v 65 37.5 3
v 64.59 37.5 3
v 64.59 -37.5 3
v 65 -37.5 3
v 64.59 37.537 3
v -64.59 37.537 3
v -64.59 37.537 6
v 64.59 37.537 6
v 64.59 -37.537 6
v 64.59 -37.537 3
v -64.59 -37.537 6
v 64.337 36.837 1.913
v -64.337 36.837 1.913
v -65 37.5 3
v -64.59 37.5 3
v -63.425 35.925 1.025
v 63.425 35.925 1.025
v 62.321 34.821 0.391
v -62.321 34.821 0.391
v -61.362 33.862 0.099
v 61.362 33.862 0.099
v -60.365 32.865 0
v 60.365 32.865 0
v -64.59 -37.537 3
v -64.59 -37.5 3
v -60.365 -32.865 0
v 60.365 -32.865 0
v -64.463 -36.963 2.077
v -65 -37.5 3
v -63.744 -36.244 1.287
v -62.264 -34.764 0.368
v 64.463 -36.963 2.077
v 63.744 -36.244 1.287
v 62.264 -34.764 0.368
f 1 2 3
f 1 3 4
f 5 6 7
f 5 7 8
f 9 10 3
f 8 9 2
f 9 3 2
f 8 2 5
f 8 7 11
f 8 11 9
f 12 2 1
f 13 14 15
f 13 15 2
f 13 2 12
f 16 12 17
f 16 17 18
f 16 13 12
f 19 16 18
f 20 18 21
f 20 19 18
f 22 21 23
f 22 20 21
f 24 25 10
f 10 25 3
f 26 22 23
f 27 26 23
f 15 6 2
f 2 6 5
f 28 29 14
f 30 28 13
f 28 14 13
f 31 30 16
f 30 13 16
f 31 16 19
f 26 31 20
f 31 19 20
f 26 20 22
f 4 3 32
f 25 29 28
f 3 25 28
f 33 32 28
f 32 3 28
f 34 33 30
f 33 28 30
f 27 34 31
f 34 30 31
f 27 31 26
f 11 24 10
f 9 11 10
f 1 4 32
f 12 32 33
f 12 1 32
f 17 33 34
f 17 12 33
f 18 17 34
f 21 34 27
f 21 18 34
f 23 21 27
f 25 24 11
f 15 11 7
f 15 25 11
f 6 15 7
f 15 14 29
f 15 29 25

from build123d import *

# Parameters (mm, degrees)
F0_W        = 130
F0_H        = 75
F1_DEPTH    = 3
F2_T1_DEPTH = 153.1732604525
F2_T3_DEPTH = 98.1732604525
F4_W        = 129.1797161102
F4_H        = 75.0736519694
F5_DEPTH    = 3


# Not quite as in the source:
# - a fillet or chamfer that OpenCascade refuses, or shapes differently, is made with other operations: its cross-section is extruded or revolved along the edge and cut away or added


with BuildPart() as f1:
    # F0 (on Top) → F1 (new body)
    with BuildSketch(Plane.XY):
        Rectangle(F0_W, F0_H)
    extrude(amount=F1_DEPTH)

    # F2: fillet of radius 5.08 on 4 edges, made by hand

    # F2_s2 → F2_t1 (cut)
    with BuildSketch(Plane.YZ.offset(-76.5866302263)):
        with BuildLine():
            ThreePointArc((37.5, 3), (35.6257826579, 0.8154484409), (32.8653479095, 0))
            Line((32.8653479095, 0), (37.5, 0))
            Line((37.5, 0), (37.5, 3))
        make_face()
        with BuildLine():
            ThreePointArc((-37.5, 3), (-35.6257826579, 0.8154484409), (-32.8653479095, 0))
            Line((-32.8653479095, 0), (-37.5, 0))
            Line((-37.5, 0), (-37.5, 3))
        make_face()
    extrude(amount=F2_T1_DEPTH, mode=Mode.SUBTRACT)

    # F2_s4 → F2_t3 (cut)
    with BuildSketch(Plane.XZ.offset(-49.0866302263)):
        with BuildLine():
            ThreePointArc((65, 3), (63.1257826579, 0.8154484409), (60.3653479095, 0))
            Line((60.3653479095, 0), (65, 0))
            Line((65, 0), (65, 3))
        make_face()
        with BuildLine():
            ThreePointArc((-65, 3), (-63.1257826579, 0.8154484409), (-60.3653479095, 0))
            Line((-60.3653479095, 0), (-65, 0))
            Line((-65, 0), (-65, 3))
        make_face()
    extrude(amount=F2_T3_DEPTH, mode=Mode.SUBTRACT)

    # F4 (on face) → F5 (join)
    with BuildSketch(Plane.XY.offset(3)):
        Rectangle(F4_W, F4_H)
    extrude(amount=F5_DEPTH)


solid = f1.part
